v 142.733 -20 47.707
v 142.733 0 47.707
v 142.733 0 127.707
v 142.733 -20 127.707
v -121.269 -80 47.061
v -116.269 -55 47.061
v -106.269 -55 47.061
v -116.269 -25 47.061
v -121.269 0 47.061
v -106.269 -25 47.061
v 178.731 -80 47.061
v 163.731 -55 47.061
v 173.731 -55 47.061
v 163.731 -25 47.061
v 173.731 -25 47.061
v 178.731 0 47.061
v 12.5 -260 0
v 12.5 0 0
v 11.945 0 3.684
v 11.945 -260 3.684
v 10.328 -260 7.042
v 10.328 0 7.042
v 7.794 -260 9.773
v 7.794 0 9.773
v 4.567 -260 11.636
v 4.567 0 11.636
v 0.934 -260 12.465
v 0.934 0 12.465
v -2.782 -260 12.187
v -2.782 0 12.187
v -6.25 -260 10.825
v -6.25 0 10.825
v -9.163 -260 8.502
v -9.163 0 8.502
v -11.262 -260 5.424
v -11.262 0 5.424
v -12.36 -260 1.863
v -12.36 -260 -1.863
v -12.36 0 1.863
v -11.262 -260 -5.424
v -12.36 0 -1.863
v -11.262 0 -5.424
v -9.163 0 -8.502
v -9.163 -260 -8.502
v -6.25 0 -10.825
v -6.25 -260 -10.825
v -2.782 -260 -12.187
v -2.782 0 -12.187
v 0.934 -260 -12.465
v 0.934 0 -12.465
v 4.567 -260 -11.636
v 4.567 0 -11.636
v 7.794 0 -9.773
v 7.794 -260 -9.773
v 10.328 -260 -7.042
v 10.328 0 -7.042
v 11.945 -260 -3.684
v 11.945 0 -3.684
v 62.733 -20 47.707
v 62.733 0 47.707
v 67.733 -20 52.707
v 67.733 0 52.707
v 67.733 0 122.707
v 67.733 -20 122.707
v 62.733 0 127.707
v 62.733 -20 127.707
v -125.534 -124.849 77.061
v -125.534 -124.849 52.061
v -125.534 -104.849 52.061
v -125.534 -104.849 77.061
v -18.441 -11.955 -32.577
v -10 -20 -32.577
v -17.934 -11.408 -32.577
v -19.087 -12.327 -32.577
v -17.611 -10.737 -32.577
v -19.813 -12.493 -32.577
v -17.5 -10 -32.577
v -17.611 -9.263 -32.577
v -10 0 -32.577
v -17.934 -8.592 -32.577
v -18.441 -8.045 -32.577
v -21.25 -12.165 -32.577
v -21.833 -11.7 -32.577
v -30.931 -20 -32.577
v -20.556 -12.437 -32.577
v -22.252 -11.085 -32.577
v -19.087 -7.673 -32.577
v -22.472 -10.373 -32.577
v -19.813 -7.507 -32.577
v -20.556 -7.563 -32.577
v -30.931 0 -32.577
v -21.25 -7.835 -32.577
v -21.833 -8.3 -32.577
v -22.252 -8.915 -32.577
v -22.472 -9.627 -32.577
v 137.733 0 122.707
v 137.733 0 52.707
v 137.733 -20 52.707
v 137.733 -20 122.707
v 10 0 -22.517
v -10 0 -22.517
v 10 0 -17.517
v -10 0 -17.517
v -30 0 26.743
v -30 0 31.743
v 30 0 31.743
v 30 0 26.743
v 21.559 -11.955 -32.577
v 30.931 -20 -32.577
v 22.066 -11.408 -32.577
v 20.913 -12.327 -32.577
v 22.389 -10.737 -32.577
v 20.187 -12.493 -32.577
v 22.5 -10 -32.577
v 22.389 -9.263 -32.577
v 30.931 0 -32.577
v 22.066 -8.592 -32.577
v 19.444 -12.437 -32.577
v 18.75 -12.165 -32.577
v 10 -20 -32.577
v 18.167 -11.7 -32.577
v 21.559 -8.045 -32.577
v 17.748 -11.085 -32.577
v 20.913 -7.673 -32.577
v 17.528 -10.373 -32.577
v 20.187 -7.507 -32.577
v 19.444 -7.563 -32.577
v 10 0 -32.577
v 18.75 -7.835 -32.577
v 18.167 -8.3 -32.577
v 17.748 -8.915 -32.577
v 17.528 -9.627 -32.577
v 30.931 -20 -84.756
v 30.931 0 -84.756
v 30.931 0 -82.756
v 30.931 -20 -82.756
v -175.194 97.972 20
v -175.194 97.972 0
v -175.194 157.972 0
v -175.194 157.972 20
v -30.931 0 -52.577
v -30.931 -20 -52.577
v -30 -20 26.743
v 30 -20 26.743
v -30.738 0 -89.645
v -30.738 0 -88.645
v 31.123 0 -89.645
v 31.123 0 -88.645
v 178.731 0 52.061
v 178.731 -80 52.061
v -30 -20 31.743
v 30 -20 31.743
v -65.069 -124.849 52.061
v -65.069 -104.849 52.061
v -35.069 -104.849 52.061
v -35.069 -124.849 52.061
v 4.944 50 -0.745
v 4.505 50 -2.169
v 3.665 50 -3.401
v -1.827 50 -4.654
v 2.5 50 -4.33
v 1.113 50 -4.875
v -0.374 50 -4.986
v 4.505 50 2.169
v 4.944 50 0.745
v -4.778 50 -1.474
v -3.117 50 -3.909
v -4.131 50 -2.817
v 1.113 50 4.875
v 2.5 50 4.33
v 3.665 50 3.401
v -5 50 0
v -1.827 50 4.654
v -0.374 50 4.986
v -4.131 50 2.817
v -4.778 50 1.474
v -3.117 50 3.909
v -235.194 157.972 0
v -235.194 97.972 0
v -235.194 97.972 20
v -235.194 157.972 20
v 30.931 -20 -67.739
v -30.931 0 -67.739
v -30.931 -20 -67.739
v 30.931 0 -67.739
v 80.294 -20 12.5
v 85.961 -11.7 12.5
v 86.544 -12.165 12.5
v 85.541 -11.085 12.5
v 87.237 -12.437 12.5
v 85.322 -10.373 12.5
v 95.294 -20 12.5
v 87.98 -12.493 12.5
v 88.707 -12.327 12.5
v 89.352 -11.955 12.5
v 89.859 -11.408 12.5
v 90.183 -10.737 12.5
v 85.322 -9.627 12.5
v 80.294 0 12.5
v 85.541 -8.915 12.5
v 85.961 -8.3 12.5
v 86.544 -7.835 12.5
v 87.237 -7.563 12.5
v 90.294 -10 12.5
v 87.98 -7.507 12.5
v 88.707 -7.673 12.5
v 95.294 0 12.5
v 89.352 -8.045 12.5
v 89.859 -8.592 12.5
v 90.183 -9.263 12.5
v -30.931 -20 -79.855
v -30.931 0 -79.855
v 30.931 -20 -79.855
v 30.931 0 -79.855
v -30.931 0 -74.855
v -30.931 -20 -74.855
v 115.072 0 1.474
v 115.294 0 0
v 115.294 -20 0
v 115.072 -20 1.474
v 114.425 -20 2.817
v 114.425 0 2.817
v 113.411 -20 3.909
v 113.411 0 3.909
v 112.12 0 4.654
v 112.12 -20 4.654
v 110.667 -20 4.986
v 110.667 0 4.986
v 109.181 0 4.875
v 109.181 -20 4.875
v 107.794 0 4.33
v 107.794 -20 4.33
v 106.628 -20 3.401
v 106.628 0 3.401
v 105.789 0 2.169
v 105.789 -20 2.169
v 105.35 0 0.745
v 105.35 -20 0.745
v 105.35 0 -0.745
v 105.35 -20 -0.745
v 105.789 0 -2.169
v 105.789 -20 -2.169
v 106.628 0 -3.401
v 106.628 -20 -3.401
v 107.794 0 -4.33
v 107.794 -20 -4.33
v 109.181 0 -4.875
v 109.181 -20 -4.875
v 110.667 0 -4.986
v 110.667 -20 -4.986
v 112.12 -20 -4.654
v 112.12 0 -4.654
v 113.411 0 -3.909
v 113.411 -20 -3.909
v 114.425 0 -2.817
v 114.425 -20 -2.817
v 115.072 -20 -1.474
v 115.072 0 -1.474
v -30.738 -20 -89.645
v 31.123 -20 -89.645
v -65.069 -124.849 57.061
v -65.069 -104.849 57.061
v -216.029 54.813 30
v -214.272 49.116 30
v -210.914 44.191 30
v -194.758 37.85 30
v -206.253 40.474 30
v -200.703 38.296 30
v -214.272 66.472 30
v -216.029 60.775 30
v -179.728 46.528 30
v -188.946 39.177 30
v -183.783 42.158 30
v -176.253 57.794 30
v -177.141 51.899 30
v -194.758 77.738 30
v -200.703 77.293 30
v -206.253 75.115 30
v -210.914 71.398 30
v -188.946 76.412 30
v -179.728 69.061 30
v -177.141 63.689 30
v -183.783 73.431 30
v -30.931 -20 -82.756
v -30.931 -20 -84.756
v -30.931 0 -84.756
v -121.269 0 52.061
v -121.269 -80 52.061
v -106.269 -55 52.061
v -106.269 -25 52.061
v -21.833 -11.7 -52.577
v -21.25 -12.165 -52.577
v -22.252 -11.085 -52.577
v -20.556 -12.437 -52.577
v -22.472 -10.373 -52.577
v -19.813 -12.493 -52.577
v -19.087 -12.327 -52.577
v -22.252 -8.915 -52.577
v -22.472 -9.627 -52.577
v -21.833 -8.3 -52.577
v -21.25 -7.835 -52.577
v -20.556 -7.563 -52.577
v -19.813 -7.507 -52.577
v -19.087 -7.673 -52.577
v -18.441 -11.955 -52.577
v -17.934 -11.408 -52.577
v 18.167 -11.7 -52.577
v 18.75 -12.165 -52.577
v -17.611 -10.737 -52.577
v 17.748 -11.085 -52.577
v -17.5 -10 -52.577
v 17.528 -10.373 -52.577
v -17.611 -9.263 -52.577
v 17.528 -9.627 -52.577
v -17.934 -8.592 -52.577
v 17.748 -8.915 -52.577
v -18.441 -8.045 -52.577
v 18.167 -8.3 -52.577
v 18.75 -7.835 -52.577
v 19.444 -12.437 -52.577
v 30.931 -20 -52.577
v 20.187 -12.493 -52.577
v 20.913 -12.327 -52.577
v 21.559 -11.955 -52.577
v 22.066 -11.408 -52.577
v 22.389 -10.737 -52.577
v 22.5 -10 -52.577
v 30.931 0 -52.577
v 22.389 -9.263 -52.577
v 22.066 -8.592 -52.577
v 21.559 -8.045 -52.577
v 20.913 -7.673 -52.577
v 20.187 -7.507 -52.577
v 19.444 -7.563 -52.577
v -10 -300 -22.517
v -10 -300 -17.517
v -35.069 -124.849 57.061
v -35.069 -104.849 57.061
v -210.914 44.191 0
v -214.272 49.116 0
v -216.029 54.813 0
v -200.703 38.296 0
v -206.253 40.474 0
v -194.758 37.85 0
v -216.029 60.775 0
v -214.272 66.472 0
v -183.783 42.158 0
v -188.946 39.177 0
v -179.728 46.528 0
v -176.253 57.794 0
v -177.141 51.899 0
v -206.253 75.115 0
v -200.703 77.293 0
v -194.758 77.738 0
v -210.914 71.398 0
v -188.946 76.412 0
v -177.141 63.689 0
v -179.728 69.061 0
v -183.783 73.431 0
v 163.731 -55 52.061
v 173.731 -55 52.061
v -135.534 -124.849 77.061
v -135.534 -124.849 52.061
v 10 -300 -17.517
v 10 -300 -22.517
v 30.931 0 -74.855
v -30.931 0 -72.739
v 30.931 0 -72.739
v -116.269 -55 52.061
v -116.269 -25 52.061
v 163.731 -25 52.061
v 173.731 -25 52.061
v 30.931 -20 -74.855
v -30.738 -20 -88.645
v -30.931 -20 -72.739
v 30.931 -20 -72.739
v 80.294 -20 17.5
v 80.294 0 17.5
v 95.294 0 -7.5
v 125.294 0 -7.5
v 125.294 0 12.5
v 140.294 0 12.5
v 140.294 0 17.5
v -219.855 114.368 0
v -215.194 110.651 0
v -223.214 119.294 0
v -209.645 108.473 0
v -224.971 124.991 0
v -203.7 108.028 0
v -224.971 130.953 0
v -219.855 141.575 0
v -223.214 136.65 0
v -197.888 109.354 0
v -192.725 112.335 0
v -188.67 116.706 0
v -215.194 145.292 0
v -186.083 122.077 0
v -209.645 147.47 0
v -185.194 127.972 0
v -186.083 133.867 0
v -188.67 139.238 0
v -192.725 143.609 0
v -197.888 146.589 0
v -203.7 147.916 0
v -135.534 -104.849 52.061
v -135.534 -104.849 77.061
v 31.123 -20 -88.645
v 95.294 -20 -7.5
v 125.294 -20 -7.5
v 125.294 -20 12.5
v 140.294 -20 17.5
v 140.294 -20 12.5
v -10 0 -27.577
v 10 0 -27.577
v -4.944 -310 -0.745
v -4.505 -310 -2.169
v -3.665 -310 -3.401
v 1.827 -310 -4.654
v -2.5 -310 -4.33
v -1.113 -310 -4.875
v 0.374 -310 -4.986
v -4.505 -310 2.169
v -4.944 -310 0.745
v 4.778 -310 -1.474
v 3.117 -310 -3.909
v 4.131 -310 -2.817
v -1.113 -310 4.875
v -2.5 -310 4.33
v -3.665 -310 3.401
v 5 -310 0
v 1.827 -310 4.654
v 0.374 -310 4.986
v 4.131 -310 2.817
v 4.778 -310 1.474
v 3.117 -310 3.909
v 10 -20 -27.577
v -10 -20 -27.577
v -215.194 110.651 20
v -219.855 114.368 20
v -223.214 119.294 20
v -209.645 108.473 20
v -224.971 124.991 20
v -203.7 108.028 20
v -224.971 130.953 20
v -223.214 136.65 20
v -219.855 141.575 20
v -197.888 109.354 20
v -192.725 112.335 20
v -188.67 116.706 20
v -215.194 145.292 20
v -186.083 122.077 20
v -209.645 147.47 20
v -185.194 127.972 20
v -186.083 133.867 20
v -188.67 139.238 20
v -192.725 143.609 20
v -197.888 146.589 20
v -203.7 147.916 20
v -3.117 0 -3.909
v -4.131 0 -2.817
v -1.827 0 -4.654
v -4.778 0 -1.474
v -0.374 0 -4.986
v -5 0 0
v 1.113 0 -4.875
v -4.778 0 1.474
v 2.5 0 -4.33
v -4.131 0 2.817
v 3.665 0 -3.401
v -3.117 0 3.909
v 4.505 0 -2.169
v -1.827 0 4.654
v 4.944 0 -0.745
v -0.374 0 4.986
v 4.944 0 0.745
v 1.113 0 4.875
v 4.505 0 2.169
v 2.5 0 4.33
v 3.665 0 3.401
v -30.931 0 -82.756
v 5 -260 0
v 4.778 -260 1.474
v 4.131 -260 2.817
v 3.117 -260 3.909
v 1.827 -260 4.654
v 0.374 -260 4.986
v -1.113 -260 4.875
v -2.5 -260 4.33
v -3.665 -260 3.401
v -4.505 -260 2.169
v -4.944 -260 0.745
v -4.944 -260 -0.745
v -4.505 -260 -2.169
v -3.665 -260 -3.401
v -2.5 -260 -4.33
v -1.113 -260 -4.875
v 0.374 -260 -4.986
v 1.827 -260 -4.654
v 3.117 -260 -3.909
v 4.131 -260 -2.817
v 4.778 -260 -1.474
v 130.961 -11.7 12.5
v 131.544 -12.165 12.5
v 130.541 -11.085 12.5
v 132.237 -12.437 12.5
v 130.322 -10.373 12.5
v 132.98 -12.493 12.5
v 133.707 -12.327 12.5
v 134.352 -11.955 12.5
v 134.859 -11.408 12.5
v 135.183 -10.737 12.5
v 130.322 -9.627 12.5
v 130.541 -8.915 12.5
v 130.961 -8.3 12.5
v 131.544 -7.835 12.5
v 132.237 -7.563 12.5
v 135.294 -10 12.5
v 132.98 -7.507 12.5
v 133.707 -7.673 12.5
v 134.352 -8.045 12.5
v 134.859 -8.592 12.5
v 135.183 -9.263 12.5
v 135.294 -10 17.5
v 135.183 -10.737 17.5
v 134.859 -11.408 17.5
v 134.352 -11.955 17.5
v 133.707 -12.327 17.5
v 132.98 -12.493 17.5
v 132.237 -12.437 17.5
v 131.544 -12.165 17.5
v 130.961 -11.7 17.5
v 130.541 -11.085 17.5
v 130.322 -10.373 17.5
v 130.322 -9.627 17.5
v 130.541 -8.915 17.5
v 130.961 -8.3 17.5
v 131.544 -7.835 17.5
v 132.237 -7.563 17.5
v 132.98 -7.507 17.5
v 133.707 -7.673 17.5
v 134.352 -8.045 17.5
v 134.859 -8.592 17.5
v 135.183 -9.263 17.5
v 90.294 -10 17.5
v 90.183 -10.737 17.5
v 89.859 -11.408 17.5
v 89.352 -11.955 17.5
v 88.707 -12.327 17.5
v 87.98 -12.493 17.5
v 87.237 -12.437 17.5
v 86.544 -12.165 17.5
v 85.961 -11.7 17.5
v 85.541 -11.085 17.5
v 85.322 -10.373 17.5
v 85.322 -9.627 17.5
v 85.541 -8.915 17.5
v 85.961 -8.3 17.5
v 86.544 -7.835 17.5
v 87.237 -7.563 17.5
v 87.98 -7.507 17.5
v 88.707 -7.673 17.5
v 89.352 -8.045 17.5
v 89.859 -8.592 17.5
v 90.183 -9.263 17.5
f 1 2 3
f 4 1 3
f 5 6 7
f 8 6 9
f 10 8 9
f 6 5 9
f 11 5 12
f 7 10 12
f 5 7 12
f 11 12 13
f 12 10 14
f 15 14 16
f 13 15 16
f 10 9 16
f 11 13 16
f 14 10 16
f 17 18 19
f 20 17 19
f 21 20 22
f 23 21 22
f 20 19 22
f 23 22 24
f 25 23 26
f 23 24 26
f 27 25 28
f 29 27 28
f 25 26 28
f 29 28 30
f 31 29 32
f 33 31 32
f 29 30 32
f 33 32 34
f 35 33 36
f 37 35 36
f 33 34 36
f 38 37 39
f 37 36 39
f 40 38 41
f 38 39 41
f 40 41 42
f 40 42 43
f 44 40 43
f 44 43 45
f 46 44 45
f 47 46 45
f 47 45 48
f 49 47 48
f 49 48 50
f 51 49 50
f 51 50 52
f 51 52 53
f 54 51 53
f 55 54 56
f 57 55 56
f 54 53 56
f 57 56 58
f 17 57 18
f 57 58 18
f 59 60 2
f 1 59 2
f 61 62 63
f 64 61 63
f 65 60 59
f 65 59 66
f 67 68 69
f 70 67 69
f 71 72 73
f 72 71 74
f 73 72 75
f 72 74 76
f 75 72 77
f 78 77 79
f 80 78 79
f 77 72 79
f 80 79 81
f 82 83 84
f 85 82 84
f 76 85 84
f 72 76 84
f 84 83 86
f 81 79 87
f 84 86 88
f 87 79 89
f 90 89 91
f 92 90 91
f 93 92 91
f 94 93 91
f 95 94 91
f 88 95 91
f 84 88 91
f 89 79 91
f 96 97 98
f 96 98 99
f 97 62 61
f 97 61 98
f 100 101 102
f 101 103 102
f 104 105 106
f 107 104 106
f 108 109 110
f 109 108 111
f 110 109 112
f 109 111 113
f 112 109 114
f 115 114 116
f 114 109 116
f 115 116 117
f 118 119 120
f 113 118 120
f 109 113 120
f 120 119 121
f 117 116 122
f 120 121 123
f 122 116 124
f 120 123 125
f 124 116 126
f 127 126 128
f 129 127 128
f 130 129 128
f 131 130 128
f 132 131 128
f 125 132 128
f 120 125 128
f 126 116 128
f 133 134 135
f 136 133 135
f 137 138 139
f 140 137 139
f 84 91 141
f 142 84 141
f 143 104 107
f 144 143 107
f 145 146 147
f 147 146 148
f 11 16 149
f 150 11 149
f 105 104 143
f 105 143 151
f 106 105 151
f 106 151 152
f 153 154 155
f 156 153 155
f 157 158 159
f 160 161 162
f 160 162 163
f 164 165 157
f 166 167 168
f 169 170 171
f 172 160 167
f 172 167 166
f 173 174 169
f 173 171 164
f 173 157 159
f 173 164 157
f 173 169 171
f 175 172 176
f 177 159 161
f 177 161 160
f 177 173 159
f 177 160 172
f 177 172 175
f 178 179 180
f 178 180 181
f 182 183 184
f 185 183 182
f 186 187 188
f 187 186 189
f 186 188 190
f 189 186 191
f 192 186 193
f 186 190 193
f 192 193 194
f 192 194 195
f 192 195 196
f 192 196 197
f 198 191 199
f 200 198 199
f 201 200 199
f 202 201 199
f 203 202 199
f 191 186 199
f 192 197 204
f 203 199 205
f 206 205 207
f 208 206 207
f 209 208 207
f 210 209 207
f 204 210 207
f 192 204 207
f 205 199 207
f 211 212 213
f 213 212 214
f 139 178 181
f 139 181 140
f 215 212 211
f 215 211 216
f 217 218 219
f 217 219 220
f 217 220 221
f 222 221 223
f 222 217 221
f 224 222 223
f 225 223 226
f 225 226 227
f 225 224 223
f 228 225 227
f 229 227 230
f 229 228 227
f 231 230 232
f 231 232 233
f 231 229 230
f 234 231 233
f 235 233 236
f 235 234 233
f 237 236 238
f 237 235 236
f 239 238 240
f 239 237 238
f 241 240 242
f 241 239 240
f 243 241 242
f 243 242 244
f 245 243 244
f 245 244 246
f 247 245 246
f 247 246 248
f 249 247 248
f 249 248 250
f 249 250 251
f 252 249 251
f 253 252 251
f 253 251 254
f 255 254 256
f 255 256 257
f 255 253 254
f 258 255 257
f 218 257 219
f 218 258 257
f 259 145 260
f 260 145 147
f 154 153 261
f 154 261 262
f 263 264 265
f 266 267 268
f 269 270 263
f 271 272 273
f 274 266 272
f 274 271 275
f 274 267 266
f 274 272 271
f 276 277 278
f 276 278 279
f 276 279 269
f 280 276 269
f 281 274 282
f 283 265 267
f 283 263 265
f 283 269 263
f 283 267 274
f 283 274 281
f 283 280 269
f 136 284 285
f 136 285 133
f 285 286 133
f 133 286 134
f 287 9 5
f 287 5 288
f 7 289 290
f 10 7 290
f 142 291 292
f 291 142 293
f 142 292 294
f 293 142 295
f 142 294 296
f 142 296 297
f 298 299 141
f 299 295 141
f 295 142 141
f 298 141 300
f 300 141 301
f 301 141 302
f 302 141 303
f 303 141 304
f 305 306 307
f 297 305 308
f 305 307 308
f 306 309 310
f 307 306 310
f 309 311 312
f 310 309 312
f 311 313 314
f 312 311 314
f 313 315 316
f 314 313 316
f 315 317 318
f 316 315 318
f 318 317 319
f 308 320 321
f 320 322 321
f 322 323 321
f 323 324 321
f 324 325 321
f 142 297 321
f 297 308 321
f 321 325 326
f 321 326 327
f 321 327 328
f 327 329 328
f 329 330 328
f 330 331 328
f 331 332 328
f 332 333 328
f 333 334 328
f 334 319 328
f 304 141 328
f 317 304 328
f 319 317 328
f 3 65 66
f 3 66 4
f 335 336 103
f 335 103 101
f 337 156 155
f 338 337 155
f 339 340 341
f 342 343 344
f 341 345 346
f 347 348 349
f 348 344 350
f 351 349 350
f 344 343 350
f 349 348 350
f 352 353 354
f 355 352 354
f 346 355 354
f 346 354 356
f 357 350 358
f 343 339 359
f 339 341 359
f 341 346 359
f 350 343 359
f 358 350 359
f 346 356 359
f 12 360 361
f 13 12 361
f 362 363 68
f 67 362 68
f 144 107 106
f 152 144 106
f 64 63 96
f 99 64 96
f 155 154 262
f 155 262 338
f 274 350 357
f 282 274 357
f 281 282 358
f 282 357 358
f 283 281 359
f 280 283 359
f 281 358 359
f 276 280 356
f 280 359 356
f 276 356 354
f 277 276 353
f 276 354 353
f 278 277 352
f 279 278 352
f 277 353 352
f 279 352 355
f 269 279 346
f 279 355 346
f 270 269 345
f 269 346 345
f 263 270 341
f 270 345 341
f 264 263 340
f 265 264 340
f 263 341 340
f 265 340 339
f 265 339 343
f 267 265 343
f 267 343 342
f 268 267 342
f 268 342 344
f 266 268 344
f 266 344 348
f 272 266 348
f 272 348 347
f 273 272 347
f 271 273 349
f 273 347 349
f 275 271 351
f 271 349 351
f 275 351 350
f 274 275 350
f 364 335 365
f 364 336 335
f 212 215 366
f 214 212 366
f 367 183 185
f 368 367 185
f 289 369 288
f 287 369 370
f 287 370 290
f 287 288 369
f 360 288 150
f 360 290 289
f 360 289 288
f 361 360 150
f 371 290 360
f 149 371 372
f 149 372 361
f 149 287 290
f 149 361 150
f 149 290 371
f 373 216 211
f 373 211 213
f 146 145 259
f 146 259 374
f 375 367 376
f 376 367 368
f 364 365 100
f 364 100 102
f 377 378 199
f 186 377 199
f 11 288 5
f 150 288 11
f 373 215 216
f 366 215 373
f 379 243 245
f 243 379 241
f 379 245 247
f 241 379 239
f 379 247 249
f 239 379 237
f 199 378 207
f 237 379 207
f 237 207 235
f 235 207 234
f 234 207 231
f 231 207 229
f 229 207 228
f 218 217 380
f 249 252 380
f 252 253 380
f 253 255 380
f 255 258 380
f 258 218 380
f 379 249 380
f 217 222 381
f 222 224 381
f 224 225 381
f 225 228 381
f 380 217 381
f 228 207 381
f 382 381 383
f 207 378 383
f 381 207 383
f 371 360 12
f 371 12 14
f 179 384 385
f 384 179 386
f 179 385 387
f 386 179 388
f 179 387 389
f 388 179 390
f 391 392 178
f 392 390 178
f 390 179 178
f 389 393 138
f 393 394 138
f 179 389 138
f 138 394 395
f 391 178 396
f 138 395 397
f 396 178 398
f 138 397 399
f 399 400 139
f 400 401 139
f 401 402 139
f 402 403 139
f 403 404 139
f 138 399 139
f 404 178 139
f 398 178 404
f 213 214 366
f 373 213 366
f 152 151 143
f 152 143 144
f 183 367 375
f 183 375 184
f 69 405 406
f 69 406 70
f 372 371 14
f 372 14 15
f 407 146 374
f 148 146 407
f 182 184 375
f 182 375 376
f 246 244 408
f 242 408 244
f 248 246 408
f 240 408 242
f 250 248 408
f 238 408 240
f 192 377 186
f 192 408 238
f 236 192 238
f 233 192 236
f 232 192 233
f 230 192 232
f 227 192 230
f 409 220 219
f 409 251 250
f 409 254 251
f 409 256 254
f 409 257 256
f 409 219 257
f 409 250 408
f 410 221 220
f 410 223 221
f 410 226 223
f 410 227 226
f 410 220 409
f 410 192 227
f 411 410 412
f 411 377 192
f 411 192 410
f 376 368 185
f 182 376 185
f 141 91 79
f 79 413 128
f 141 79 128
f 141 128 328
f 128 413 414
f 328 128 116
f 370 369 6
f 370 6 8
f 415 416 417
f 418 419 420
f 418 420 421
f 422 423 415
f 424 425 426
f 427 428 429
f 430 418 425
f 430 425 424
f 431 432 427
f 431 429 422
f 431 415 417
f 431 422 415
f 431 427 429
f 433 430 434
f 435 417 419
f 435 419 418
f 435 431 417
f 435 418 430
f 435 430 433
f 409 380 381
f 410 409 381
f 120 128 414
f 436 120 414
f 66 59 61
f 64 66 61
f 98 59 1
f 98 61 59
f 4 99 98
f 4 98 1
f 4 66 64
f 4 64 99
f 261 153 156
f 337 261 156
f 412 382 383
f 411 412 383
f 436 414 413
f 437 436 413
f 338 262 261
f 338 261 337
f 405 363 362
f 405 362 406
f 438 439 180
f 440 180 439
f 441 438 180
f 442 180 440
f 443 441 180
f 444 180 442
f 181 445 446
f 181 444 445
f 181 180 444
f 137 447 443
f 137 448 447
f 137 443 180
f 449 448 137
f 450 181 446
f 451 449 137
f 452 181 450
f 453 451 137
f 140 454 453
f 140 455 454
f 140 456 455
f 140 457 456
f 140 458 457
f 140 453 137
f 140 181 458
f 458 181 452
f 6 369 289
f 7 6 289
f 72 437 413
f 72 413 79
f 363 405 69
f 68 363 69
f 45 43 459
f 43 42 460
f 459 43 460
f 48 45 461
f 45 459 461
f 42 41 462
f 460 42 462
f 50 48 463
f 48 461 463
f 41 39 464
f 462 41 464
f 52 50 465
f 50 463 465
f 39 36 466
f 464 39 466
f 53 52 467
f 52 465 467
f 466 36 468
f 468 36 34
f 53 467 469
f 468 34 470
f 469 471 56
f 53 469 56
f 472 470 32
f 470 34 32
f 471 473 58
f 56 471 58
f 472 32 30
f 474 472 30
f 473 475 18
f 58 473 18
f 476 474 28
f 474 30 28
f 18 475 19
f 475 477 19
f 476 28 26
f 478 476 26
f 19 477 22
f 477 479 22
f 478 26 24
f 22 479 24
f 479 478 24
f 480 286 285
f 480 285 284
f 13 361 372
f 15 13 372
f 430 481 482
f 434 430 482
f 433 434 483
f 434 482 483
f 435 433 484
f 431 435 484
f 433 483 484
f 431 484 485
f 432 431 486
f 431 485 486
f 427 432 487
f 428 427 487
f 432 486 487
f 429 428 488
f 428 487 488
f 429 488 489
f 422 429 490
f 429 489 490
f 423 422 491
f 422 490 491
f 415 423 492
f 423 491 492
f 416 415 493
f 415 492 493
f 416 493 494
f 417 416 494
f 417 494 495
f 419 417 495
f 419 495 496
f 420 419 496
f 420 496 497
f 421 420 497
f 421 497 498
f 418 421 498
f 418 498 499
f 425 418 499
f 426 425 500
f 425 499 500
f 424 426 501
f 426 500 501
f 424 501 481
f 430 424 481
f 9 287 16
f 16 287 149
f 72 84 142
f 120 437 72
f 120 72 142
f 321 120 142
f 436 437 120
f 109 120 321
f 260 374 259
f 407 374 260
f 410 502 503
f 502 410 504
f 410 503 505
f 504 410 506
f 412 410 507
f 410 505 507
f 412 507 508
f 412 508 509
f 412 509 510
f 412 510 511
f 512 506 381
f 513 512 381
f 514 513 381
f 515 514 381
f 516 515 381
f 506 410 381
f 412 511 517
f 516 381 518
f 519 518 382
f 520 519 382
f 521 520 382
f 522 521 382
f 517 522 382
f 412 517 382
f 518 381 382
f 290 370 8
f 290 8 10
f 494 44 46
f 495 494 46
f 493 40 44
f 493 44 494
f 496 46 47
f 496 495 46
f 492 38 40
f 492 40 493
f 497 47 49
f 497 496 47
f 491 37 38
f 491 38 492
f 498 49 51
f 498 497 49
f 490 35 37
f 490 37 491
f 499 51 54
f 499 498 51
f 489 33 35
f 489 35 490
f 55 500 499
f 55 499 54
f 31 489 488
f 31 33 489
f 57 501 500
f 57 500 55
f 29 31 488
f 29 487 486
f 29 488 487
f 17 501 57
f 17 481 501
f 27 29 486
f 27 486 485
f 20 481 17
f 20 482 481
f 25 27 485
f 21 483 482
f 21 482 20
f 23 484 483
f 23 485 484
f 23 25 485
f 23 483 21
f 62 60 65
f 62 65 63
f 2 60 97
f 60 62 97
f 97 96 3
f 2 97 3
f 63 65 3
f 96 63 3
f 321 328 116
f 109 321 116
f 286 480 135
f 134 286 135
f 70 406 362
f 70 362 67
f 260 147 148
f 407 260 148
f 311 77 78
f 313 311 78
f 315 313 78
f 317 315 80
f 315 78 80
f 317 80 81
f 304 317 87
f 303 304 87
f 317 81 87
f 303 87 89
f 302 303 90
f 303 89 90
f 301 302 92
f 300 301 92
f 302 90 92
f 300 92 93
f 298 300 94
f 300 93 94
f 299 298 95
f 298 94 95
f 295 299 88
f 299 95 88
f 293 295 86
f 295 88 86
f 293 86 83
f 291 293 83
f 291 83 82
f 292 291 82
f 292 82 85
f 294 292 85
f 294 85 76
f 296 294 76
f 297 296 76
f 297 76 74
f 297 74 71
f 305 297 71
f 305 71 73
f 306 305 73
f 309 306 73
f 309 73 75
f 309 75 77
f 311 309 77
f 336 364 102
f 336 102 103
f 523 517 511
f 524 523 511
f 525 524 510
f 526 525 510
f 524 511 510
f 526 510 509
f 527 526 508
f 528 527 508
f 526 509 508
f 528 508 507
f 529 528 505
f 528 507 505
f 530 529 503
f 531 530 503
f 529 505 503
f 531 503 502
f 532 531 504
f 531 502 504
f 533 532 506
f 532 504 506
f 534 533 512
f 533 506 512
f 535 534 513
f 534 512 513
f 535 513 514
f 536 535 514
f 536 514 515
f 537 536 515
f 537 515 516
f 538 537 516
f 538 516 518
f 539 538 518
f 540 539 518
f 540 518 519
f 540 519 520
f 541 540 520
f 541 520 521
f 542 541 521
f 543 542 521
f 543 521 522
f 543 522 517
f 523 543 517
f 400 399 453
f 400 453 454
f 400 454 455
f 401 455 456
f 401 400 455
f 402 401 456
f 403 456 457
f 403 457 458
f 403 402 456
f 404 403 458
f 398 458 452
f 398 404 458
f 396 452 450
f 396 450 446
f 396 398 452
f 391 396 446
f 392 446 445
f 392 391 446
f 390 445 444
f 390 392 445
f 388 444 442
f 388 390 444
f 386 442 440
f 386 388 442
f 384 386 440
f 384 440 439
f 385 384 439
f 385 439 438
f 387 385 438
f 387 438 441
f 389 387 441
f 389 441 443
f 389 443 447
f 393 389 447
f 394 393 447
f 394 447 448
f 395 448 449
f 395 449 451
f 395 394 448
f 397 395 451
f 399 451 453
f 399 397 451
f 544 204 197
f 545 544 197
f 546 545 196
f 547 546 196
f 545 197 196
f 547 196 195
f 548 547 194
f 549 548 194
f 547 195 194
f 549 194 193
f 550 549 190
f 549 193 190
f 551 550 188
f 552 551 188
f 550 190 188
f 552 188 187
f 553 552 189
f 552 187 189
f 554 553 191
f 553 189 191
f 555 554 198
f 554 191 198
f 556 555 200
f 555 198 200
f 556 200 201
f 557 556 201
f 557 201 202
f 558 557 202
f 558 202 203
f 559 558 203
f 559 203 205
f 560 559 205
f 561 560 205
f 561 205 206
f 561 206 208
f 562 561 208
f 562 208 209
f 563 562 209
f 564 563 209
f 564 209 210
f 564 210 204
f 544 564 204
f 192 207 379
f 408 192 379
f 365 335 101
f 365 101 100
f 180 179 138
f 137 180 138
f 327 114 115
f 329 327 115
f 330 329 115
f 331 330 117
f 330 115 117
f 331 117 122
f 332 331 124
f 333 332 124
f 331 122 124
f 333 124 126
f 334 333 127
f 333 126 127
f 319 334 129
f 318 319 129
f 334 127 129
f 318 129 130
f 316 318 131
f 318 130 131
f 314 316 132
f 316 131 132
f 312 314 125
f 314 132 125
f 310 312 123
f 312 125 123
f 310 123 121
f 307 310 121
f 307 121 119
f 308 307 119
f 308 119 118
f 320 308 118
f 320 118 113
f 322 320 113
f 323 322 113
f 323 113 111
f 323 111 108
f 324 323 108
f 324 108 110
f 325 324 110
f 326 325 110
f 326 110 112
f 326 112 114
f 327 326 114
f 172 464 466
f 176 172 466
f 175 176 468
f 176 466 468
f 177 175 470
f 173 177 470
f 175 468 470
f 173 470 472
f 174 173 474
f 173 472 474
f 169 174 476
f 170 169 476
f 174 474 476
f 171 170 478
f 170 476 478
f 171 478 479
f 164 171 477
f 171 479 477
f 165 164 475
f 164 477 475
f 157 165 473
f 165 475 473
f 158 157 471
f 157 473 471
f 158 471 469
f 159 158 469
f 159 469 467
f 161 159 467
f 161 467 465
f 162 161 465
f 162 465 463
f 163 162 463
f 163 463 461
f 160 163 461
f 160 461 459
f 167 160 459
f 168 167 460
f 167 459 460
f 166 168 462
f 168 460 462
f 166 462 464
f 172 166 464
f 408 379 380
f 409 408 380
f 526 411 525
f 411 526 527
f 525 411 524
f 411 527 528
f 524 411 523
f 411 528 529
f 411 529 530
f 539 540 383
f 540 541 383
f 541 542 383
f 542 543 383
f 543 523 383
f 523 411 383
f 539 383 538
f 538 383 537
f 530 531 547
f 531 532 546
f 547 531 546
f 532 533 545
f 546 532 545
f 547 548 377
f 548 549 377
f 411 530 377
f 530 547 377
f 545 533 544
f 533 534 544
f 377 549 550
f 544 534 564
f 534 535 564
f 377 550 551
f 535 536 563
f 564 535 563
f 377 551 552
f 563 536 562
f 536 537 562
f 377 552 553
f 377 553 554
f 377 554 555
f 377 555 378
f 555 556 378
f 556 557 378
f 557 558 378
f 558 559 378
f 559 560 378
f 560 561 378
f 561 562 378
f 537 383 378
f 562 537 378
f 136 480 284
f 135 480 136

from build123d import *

# Parameters (mm, degrees)
F0_R      = 5
F1_DEPTH  = 20
F0_W      = 60
F0_H      = 5
F0_W_2    = 80
F0_H_2    = 80
F0_W_3    = 70
F0_H_3    = 70
F0_W_4    = 61.861140081
F0_H_4    = 1
F0_H_5    = 2
F0_R_2    = 12.5
F2_DEPTH  = 260
F3_R      = 5
F4_DEPTH  = 50
F5_DEPTH  = 300
F6_R      = 2.5
F7_R      = 2.5
F8_DEPTH  = 25
F10_R     = 2.5
F9_R      = 2.5
F11_DEPTH = 25
F16_R     = 5
F17_DEPTH = 50
F18_W     = 300
F18_H     = 5
F19_DEPTH = 80
F21_R     = 20
F22_DEPTH = 30
F21_W     = 60
F21_H     = 60
F23_DEPTH = 20
F20_W     = 10
F20_H     = 30
F24_DEPTH = 141.7069985357
F20_H_2   = 20
F25_DEPTH = 25
F20_W_2   = 30
F26_DEPTH = 5


# Not quite as in the source:
# - a feature of the source that left no trace in its solid (it failed there, or was rolled back) is left out
# - a feature names something its author has since deleted; it is built from what else it names


with BuildPart() as f1:
    # F0 (on Front) → F1 (new body)
    with BuildSketch(Plane.XZ):
        Polygon((95.2936565876, -7.5), (110.2936565876, -7.5), (125.2936565876, -7.5), (125.2936565876, 12.5), (140.2936565876, 12.5), (140.2936565876, 17.5), (110.2936565876, 17.5), (80.2936565876, 17.5), (80.2936565876, 12.5), (95.2936565876, 12.5), align=None)
        with Locations((110.2936565876, 0)):
            Circle(F0_R, mode=Mode.SUBTRACT)
    extrude(amount=F1_DEPTH)

    # F10 (on face) + F9 (on face) → F11 (cut)
    with BuildSketch(Plane(origin=(0, 0, 12.5), x_dir=(1, 0, 0), z_dir=(0, 0, -1))):
        with Locations((87.7936565876, 10)):
            Circle(F10_R)
    with BuildSketch(Plane(origin=(0, 0, 12.5), x_dir=(1, 0, 0), z_dir=(0, 0, -1))):
        with Locations((132.7936565876, 10)):
            Circle(F9_R)
    extrude(amount=-F11_DEPTH, mode=Mode.SUBTRACT)


with BuildPart() as f1b:
    # F0 (on Front) → F1, piece 2 (new body)
    with BuildSketch(Plane.XZ):
        with Locations((0, 29.2427036911)):
            Rectangle(F0_W, F0_H)
    extrude(amount=F1_DEPTH)


with BuildPart() as f1c:
    # F0 (on Front) → F1, piece 3 (new body)
    with BuildSketch(Plane.XZ):
        Polygon((10, -27.5771580637), (0, -27.5771580637), (-10, -27.5771580637), (-10, -32.5771580637), (-10.9305700405, -32.5771580637), (-30.9305700405, -32.5771580637), (-30.9305700405, -52.5771580637), (0, -52.5771580637), (30.9305700405, -52.5771580637), (30.9305700405, -32.5771580637), (10.9305700405, -32.5771580637), (10, -32.5771580637), align=None)
    extrude(amount=F1_DEPTH)

    # F6 (on face) + F7 (on face) → F8 (cut)
    with BuildSketch(Plane.XY.offset(-32.5771580637)):
        with Locations((-20, -10)):
            Circle(F6_R)
    with BuildSketch(Plane.XY.offset(-32.5771580637)):
        with Locations((20, -10)):
            Circle(F7_R)
    extrude(amount=-F8_DEPTH, mode=Mode.SUBTRACT)


with BuildPart() as f1d:
    # F0 (on Front) → F1, piece 4 (new body)
    with BuildSketch(Plane.XZ):
        with Locations((102.7326732874, 87.7068325877)):
            Rectangle(F0_W_2, F0_H_2)
        with Locations((102.7326732874, 87.7068325877)):
            Rectangle(F0_W_3, F0_H_3, mode=Mode.SUBTRACT)
    extrude(amount=F1_DEPTH)


with BuildPart() as f1e:
    # F0 (on Front) → F1, piece 5 (new body)
    with BuildSketch(Plane.XZ):
        with Locations((0, -77.355325222)):
            Rectangle(F0_W_4, F0_H)
    extrude(amount=F1_DEPTH)


with BuildPart() as f1f:
    # F0 (on Front) → F1, piece 6 (new body)
    with BuildSketch(Plane.XZ):
        with Locations((0.1928325291, -89.1451310813)):
            Rectangle(F0_W_4, F0_H_4)
    extrude(amount=F1_DEPTH)


with BuildPart() as f1g:
    # F0 (on Front) → F1, piece 7 (new body)
    with BuildSketch(Plane.XZ):
        with Locations((0, -83.756296128)):
            Rectangle(F0_W_4, F0_H_5)
    extrude(amount=F1_DEPTH)


with BuildPart() as f1h:
    # F0 (on Front) → F1, piece 8 (new body)
    with BuildSketch(Plane.XZ):
        with Locations((0, -70.2389810979)):
            Rectangle(F0_W_4, F0_H)
    extrude(amount=F1_DEPTH)


with BuildPart() as f2:
    # F0 (on Front) → F2 (new body)
    with BuildSketch(Plane.XZ):
        Circle(F0_R_2)
    extrude(amount=F2_DEPTH)

    # F3 (on face) → F4 (join)
    with BuildSketch(Plane.XZ.offset(260)):
        Circle(F3_R)
    extrude(amount=F4_DEPTH)

    # F16 (on face) → F17 (join)
    with BuildSketch(Plane(origin=(0, 0, 0), x_dir=(-1, 0, 0), z_dir=(0, 1, 0))):
        Circle(F16_R)
    extrude(amount=F17_DEPTH)


with BuildPart() as f5:
    # F0 (on Front) → F5 (new body)
    with BuildSketch(Plane.XZ):
        Polygon((-10, -22.5167013705), (0, -22.5167013705), (10, -22.5167013705), (10, -17.5167013705), (0, -17.5167013705), (-10, -17.5167013705), align=None)
    extrude(amount=F5_DEPTH)


with BuildPart() as f19:
    # F18 (on Front) → F19 (new body)
    with BuildSketch(Plane.XZ):
        with Locations((28.7307251245, 49.5608674544)):
            Rectangle(F18_W, F18_H)
    extrude(amount=F19_DEPTH)

    # F20 (on face) → F24 (cut, through all)
    with BuildSketch(Plane.XY.offset(52.0608674544)):
        with Locations((-111.2692748755, -40)):
            Rectangle(F20_W, F20_H)
        with Locations((168.7307251245, -40)):
            Rectangle(F20_W, F20_H)
    extrude(amount=-F24_DEPTH, mode=Mode.SUBTRACT)


with BuildPart() as f22:
    # F21 (on Top) → F22 (new body)
    with BuildSketch(Plane.XY):
        with Locations((-196.2528675795, 57.794149965)):
            Circle(F21_R)
    extrude(amount=F22_DEPTH)


with BuildPart() as f23:
    # F21 (on Top) → F23 (new body)
    with BuildSketch(Plane.XY):
        with Locations((-205.1943850517, 127.9719012976)):
            Rectangle(F21_W, F21_H)
        with Locations((-205.1943850517, 127.9719012976)):
            Circle(F21_R, mode=Mode.SUBTRACT)
    extrude(amount=F23_DEPTH)


with BuildPart() as f25:
    # F20 (on face) → F25 (new body)
    with BuildSketch(Plane.XY.offset(52.0608674544)):
        with Locations((-130.5344802141, -114.8494374752)):
            Rectangle(F20_W, F20_H_2)
    extrude(amount=F25_DEPTH)


with BuildPart() as f26:
    # F20 (on face) → F26 (new body)
    with BuildSketch(Plane.XY.offset(52.0608674544)):
        with Locations((-50.0688782334, -114.8494374752)):
            Rectangle(F20_W_2, F20_H_2)
    extrude(amount=F26_DEPTH)


solid = Compound([f1.part, f1b.part, f1c.part, f1d.part, f1e.part, f1f.part, f1g.part, f1h.part, f2.part, f5.part, f19.part, f22.part, f23.part, f25.part, f26.part])
